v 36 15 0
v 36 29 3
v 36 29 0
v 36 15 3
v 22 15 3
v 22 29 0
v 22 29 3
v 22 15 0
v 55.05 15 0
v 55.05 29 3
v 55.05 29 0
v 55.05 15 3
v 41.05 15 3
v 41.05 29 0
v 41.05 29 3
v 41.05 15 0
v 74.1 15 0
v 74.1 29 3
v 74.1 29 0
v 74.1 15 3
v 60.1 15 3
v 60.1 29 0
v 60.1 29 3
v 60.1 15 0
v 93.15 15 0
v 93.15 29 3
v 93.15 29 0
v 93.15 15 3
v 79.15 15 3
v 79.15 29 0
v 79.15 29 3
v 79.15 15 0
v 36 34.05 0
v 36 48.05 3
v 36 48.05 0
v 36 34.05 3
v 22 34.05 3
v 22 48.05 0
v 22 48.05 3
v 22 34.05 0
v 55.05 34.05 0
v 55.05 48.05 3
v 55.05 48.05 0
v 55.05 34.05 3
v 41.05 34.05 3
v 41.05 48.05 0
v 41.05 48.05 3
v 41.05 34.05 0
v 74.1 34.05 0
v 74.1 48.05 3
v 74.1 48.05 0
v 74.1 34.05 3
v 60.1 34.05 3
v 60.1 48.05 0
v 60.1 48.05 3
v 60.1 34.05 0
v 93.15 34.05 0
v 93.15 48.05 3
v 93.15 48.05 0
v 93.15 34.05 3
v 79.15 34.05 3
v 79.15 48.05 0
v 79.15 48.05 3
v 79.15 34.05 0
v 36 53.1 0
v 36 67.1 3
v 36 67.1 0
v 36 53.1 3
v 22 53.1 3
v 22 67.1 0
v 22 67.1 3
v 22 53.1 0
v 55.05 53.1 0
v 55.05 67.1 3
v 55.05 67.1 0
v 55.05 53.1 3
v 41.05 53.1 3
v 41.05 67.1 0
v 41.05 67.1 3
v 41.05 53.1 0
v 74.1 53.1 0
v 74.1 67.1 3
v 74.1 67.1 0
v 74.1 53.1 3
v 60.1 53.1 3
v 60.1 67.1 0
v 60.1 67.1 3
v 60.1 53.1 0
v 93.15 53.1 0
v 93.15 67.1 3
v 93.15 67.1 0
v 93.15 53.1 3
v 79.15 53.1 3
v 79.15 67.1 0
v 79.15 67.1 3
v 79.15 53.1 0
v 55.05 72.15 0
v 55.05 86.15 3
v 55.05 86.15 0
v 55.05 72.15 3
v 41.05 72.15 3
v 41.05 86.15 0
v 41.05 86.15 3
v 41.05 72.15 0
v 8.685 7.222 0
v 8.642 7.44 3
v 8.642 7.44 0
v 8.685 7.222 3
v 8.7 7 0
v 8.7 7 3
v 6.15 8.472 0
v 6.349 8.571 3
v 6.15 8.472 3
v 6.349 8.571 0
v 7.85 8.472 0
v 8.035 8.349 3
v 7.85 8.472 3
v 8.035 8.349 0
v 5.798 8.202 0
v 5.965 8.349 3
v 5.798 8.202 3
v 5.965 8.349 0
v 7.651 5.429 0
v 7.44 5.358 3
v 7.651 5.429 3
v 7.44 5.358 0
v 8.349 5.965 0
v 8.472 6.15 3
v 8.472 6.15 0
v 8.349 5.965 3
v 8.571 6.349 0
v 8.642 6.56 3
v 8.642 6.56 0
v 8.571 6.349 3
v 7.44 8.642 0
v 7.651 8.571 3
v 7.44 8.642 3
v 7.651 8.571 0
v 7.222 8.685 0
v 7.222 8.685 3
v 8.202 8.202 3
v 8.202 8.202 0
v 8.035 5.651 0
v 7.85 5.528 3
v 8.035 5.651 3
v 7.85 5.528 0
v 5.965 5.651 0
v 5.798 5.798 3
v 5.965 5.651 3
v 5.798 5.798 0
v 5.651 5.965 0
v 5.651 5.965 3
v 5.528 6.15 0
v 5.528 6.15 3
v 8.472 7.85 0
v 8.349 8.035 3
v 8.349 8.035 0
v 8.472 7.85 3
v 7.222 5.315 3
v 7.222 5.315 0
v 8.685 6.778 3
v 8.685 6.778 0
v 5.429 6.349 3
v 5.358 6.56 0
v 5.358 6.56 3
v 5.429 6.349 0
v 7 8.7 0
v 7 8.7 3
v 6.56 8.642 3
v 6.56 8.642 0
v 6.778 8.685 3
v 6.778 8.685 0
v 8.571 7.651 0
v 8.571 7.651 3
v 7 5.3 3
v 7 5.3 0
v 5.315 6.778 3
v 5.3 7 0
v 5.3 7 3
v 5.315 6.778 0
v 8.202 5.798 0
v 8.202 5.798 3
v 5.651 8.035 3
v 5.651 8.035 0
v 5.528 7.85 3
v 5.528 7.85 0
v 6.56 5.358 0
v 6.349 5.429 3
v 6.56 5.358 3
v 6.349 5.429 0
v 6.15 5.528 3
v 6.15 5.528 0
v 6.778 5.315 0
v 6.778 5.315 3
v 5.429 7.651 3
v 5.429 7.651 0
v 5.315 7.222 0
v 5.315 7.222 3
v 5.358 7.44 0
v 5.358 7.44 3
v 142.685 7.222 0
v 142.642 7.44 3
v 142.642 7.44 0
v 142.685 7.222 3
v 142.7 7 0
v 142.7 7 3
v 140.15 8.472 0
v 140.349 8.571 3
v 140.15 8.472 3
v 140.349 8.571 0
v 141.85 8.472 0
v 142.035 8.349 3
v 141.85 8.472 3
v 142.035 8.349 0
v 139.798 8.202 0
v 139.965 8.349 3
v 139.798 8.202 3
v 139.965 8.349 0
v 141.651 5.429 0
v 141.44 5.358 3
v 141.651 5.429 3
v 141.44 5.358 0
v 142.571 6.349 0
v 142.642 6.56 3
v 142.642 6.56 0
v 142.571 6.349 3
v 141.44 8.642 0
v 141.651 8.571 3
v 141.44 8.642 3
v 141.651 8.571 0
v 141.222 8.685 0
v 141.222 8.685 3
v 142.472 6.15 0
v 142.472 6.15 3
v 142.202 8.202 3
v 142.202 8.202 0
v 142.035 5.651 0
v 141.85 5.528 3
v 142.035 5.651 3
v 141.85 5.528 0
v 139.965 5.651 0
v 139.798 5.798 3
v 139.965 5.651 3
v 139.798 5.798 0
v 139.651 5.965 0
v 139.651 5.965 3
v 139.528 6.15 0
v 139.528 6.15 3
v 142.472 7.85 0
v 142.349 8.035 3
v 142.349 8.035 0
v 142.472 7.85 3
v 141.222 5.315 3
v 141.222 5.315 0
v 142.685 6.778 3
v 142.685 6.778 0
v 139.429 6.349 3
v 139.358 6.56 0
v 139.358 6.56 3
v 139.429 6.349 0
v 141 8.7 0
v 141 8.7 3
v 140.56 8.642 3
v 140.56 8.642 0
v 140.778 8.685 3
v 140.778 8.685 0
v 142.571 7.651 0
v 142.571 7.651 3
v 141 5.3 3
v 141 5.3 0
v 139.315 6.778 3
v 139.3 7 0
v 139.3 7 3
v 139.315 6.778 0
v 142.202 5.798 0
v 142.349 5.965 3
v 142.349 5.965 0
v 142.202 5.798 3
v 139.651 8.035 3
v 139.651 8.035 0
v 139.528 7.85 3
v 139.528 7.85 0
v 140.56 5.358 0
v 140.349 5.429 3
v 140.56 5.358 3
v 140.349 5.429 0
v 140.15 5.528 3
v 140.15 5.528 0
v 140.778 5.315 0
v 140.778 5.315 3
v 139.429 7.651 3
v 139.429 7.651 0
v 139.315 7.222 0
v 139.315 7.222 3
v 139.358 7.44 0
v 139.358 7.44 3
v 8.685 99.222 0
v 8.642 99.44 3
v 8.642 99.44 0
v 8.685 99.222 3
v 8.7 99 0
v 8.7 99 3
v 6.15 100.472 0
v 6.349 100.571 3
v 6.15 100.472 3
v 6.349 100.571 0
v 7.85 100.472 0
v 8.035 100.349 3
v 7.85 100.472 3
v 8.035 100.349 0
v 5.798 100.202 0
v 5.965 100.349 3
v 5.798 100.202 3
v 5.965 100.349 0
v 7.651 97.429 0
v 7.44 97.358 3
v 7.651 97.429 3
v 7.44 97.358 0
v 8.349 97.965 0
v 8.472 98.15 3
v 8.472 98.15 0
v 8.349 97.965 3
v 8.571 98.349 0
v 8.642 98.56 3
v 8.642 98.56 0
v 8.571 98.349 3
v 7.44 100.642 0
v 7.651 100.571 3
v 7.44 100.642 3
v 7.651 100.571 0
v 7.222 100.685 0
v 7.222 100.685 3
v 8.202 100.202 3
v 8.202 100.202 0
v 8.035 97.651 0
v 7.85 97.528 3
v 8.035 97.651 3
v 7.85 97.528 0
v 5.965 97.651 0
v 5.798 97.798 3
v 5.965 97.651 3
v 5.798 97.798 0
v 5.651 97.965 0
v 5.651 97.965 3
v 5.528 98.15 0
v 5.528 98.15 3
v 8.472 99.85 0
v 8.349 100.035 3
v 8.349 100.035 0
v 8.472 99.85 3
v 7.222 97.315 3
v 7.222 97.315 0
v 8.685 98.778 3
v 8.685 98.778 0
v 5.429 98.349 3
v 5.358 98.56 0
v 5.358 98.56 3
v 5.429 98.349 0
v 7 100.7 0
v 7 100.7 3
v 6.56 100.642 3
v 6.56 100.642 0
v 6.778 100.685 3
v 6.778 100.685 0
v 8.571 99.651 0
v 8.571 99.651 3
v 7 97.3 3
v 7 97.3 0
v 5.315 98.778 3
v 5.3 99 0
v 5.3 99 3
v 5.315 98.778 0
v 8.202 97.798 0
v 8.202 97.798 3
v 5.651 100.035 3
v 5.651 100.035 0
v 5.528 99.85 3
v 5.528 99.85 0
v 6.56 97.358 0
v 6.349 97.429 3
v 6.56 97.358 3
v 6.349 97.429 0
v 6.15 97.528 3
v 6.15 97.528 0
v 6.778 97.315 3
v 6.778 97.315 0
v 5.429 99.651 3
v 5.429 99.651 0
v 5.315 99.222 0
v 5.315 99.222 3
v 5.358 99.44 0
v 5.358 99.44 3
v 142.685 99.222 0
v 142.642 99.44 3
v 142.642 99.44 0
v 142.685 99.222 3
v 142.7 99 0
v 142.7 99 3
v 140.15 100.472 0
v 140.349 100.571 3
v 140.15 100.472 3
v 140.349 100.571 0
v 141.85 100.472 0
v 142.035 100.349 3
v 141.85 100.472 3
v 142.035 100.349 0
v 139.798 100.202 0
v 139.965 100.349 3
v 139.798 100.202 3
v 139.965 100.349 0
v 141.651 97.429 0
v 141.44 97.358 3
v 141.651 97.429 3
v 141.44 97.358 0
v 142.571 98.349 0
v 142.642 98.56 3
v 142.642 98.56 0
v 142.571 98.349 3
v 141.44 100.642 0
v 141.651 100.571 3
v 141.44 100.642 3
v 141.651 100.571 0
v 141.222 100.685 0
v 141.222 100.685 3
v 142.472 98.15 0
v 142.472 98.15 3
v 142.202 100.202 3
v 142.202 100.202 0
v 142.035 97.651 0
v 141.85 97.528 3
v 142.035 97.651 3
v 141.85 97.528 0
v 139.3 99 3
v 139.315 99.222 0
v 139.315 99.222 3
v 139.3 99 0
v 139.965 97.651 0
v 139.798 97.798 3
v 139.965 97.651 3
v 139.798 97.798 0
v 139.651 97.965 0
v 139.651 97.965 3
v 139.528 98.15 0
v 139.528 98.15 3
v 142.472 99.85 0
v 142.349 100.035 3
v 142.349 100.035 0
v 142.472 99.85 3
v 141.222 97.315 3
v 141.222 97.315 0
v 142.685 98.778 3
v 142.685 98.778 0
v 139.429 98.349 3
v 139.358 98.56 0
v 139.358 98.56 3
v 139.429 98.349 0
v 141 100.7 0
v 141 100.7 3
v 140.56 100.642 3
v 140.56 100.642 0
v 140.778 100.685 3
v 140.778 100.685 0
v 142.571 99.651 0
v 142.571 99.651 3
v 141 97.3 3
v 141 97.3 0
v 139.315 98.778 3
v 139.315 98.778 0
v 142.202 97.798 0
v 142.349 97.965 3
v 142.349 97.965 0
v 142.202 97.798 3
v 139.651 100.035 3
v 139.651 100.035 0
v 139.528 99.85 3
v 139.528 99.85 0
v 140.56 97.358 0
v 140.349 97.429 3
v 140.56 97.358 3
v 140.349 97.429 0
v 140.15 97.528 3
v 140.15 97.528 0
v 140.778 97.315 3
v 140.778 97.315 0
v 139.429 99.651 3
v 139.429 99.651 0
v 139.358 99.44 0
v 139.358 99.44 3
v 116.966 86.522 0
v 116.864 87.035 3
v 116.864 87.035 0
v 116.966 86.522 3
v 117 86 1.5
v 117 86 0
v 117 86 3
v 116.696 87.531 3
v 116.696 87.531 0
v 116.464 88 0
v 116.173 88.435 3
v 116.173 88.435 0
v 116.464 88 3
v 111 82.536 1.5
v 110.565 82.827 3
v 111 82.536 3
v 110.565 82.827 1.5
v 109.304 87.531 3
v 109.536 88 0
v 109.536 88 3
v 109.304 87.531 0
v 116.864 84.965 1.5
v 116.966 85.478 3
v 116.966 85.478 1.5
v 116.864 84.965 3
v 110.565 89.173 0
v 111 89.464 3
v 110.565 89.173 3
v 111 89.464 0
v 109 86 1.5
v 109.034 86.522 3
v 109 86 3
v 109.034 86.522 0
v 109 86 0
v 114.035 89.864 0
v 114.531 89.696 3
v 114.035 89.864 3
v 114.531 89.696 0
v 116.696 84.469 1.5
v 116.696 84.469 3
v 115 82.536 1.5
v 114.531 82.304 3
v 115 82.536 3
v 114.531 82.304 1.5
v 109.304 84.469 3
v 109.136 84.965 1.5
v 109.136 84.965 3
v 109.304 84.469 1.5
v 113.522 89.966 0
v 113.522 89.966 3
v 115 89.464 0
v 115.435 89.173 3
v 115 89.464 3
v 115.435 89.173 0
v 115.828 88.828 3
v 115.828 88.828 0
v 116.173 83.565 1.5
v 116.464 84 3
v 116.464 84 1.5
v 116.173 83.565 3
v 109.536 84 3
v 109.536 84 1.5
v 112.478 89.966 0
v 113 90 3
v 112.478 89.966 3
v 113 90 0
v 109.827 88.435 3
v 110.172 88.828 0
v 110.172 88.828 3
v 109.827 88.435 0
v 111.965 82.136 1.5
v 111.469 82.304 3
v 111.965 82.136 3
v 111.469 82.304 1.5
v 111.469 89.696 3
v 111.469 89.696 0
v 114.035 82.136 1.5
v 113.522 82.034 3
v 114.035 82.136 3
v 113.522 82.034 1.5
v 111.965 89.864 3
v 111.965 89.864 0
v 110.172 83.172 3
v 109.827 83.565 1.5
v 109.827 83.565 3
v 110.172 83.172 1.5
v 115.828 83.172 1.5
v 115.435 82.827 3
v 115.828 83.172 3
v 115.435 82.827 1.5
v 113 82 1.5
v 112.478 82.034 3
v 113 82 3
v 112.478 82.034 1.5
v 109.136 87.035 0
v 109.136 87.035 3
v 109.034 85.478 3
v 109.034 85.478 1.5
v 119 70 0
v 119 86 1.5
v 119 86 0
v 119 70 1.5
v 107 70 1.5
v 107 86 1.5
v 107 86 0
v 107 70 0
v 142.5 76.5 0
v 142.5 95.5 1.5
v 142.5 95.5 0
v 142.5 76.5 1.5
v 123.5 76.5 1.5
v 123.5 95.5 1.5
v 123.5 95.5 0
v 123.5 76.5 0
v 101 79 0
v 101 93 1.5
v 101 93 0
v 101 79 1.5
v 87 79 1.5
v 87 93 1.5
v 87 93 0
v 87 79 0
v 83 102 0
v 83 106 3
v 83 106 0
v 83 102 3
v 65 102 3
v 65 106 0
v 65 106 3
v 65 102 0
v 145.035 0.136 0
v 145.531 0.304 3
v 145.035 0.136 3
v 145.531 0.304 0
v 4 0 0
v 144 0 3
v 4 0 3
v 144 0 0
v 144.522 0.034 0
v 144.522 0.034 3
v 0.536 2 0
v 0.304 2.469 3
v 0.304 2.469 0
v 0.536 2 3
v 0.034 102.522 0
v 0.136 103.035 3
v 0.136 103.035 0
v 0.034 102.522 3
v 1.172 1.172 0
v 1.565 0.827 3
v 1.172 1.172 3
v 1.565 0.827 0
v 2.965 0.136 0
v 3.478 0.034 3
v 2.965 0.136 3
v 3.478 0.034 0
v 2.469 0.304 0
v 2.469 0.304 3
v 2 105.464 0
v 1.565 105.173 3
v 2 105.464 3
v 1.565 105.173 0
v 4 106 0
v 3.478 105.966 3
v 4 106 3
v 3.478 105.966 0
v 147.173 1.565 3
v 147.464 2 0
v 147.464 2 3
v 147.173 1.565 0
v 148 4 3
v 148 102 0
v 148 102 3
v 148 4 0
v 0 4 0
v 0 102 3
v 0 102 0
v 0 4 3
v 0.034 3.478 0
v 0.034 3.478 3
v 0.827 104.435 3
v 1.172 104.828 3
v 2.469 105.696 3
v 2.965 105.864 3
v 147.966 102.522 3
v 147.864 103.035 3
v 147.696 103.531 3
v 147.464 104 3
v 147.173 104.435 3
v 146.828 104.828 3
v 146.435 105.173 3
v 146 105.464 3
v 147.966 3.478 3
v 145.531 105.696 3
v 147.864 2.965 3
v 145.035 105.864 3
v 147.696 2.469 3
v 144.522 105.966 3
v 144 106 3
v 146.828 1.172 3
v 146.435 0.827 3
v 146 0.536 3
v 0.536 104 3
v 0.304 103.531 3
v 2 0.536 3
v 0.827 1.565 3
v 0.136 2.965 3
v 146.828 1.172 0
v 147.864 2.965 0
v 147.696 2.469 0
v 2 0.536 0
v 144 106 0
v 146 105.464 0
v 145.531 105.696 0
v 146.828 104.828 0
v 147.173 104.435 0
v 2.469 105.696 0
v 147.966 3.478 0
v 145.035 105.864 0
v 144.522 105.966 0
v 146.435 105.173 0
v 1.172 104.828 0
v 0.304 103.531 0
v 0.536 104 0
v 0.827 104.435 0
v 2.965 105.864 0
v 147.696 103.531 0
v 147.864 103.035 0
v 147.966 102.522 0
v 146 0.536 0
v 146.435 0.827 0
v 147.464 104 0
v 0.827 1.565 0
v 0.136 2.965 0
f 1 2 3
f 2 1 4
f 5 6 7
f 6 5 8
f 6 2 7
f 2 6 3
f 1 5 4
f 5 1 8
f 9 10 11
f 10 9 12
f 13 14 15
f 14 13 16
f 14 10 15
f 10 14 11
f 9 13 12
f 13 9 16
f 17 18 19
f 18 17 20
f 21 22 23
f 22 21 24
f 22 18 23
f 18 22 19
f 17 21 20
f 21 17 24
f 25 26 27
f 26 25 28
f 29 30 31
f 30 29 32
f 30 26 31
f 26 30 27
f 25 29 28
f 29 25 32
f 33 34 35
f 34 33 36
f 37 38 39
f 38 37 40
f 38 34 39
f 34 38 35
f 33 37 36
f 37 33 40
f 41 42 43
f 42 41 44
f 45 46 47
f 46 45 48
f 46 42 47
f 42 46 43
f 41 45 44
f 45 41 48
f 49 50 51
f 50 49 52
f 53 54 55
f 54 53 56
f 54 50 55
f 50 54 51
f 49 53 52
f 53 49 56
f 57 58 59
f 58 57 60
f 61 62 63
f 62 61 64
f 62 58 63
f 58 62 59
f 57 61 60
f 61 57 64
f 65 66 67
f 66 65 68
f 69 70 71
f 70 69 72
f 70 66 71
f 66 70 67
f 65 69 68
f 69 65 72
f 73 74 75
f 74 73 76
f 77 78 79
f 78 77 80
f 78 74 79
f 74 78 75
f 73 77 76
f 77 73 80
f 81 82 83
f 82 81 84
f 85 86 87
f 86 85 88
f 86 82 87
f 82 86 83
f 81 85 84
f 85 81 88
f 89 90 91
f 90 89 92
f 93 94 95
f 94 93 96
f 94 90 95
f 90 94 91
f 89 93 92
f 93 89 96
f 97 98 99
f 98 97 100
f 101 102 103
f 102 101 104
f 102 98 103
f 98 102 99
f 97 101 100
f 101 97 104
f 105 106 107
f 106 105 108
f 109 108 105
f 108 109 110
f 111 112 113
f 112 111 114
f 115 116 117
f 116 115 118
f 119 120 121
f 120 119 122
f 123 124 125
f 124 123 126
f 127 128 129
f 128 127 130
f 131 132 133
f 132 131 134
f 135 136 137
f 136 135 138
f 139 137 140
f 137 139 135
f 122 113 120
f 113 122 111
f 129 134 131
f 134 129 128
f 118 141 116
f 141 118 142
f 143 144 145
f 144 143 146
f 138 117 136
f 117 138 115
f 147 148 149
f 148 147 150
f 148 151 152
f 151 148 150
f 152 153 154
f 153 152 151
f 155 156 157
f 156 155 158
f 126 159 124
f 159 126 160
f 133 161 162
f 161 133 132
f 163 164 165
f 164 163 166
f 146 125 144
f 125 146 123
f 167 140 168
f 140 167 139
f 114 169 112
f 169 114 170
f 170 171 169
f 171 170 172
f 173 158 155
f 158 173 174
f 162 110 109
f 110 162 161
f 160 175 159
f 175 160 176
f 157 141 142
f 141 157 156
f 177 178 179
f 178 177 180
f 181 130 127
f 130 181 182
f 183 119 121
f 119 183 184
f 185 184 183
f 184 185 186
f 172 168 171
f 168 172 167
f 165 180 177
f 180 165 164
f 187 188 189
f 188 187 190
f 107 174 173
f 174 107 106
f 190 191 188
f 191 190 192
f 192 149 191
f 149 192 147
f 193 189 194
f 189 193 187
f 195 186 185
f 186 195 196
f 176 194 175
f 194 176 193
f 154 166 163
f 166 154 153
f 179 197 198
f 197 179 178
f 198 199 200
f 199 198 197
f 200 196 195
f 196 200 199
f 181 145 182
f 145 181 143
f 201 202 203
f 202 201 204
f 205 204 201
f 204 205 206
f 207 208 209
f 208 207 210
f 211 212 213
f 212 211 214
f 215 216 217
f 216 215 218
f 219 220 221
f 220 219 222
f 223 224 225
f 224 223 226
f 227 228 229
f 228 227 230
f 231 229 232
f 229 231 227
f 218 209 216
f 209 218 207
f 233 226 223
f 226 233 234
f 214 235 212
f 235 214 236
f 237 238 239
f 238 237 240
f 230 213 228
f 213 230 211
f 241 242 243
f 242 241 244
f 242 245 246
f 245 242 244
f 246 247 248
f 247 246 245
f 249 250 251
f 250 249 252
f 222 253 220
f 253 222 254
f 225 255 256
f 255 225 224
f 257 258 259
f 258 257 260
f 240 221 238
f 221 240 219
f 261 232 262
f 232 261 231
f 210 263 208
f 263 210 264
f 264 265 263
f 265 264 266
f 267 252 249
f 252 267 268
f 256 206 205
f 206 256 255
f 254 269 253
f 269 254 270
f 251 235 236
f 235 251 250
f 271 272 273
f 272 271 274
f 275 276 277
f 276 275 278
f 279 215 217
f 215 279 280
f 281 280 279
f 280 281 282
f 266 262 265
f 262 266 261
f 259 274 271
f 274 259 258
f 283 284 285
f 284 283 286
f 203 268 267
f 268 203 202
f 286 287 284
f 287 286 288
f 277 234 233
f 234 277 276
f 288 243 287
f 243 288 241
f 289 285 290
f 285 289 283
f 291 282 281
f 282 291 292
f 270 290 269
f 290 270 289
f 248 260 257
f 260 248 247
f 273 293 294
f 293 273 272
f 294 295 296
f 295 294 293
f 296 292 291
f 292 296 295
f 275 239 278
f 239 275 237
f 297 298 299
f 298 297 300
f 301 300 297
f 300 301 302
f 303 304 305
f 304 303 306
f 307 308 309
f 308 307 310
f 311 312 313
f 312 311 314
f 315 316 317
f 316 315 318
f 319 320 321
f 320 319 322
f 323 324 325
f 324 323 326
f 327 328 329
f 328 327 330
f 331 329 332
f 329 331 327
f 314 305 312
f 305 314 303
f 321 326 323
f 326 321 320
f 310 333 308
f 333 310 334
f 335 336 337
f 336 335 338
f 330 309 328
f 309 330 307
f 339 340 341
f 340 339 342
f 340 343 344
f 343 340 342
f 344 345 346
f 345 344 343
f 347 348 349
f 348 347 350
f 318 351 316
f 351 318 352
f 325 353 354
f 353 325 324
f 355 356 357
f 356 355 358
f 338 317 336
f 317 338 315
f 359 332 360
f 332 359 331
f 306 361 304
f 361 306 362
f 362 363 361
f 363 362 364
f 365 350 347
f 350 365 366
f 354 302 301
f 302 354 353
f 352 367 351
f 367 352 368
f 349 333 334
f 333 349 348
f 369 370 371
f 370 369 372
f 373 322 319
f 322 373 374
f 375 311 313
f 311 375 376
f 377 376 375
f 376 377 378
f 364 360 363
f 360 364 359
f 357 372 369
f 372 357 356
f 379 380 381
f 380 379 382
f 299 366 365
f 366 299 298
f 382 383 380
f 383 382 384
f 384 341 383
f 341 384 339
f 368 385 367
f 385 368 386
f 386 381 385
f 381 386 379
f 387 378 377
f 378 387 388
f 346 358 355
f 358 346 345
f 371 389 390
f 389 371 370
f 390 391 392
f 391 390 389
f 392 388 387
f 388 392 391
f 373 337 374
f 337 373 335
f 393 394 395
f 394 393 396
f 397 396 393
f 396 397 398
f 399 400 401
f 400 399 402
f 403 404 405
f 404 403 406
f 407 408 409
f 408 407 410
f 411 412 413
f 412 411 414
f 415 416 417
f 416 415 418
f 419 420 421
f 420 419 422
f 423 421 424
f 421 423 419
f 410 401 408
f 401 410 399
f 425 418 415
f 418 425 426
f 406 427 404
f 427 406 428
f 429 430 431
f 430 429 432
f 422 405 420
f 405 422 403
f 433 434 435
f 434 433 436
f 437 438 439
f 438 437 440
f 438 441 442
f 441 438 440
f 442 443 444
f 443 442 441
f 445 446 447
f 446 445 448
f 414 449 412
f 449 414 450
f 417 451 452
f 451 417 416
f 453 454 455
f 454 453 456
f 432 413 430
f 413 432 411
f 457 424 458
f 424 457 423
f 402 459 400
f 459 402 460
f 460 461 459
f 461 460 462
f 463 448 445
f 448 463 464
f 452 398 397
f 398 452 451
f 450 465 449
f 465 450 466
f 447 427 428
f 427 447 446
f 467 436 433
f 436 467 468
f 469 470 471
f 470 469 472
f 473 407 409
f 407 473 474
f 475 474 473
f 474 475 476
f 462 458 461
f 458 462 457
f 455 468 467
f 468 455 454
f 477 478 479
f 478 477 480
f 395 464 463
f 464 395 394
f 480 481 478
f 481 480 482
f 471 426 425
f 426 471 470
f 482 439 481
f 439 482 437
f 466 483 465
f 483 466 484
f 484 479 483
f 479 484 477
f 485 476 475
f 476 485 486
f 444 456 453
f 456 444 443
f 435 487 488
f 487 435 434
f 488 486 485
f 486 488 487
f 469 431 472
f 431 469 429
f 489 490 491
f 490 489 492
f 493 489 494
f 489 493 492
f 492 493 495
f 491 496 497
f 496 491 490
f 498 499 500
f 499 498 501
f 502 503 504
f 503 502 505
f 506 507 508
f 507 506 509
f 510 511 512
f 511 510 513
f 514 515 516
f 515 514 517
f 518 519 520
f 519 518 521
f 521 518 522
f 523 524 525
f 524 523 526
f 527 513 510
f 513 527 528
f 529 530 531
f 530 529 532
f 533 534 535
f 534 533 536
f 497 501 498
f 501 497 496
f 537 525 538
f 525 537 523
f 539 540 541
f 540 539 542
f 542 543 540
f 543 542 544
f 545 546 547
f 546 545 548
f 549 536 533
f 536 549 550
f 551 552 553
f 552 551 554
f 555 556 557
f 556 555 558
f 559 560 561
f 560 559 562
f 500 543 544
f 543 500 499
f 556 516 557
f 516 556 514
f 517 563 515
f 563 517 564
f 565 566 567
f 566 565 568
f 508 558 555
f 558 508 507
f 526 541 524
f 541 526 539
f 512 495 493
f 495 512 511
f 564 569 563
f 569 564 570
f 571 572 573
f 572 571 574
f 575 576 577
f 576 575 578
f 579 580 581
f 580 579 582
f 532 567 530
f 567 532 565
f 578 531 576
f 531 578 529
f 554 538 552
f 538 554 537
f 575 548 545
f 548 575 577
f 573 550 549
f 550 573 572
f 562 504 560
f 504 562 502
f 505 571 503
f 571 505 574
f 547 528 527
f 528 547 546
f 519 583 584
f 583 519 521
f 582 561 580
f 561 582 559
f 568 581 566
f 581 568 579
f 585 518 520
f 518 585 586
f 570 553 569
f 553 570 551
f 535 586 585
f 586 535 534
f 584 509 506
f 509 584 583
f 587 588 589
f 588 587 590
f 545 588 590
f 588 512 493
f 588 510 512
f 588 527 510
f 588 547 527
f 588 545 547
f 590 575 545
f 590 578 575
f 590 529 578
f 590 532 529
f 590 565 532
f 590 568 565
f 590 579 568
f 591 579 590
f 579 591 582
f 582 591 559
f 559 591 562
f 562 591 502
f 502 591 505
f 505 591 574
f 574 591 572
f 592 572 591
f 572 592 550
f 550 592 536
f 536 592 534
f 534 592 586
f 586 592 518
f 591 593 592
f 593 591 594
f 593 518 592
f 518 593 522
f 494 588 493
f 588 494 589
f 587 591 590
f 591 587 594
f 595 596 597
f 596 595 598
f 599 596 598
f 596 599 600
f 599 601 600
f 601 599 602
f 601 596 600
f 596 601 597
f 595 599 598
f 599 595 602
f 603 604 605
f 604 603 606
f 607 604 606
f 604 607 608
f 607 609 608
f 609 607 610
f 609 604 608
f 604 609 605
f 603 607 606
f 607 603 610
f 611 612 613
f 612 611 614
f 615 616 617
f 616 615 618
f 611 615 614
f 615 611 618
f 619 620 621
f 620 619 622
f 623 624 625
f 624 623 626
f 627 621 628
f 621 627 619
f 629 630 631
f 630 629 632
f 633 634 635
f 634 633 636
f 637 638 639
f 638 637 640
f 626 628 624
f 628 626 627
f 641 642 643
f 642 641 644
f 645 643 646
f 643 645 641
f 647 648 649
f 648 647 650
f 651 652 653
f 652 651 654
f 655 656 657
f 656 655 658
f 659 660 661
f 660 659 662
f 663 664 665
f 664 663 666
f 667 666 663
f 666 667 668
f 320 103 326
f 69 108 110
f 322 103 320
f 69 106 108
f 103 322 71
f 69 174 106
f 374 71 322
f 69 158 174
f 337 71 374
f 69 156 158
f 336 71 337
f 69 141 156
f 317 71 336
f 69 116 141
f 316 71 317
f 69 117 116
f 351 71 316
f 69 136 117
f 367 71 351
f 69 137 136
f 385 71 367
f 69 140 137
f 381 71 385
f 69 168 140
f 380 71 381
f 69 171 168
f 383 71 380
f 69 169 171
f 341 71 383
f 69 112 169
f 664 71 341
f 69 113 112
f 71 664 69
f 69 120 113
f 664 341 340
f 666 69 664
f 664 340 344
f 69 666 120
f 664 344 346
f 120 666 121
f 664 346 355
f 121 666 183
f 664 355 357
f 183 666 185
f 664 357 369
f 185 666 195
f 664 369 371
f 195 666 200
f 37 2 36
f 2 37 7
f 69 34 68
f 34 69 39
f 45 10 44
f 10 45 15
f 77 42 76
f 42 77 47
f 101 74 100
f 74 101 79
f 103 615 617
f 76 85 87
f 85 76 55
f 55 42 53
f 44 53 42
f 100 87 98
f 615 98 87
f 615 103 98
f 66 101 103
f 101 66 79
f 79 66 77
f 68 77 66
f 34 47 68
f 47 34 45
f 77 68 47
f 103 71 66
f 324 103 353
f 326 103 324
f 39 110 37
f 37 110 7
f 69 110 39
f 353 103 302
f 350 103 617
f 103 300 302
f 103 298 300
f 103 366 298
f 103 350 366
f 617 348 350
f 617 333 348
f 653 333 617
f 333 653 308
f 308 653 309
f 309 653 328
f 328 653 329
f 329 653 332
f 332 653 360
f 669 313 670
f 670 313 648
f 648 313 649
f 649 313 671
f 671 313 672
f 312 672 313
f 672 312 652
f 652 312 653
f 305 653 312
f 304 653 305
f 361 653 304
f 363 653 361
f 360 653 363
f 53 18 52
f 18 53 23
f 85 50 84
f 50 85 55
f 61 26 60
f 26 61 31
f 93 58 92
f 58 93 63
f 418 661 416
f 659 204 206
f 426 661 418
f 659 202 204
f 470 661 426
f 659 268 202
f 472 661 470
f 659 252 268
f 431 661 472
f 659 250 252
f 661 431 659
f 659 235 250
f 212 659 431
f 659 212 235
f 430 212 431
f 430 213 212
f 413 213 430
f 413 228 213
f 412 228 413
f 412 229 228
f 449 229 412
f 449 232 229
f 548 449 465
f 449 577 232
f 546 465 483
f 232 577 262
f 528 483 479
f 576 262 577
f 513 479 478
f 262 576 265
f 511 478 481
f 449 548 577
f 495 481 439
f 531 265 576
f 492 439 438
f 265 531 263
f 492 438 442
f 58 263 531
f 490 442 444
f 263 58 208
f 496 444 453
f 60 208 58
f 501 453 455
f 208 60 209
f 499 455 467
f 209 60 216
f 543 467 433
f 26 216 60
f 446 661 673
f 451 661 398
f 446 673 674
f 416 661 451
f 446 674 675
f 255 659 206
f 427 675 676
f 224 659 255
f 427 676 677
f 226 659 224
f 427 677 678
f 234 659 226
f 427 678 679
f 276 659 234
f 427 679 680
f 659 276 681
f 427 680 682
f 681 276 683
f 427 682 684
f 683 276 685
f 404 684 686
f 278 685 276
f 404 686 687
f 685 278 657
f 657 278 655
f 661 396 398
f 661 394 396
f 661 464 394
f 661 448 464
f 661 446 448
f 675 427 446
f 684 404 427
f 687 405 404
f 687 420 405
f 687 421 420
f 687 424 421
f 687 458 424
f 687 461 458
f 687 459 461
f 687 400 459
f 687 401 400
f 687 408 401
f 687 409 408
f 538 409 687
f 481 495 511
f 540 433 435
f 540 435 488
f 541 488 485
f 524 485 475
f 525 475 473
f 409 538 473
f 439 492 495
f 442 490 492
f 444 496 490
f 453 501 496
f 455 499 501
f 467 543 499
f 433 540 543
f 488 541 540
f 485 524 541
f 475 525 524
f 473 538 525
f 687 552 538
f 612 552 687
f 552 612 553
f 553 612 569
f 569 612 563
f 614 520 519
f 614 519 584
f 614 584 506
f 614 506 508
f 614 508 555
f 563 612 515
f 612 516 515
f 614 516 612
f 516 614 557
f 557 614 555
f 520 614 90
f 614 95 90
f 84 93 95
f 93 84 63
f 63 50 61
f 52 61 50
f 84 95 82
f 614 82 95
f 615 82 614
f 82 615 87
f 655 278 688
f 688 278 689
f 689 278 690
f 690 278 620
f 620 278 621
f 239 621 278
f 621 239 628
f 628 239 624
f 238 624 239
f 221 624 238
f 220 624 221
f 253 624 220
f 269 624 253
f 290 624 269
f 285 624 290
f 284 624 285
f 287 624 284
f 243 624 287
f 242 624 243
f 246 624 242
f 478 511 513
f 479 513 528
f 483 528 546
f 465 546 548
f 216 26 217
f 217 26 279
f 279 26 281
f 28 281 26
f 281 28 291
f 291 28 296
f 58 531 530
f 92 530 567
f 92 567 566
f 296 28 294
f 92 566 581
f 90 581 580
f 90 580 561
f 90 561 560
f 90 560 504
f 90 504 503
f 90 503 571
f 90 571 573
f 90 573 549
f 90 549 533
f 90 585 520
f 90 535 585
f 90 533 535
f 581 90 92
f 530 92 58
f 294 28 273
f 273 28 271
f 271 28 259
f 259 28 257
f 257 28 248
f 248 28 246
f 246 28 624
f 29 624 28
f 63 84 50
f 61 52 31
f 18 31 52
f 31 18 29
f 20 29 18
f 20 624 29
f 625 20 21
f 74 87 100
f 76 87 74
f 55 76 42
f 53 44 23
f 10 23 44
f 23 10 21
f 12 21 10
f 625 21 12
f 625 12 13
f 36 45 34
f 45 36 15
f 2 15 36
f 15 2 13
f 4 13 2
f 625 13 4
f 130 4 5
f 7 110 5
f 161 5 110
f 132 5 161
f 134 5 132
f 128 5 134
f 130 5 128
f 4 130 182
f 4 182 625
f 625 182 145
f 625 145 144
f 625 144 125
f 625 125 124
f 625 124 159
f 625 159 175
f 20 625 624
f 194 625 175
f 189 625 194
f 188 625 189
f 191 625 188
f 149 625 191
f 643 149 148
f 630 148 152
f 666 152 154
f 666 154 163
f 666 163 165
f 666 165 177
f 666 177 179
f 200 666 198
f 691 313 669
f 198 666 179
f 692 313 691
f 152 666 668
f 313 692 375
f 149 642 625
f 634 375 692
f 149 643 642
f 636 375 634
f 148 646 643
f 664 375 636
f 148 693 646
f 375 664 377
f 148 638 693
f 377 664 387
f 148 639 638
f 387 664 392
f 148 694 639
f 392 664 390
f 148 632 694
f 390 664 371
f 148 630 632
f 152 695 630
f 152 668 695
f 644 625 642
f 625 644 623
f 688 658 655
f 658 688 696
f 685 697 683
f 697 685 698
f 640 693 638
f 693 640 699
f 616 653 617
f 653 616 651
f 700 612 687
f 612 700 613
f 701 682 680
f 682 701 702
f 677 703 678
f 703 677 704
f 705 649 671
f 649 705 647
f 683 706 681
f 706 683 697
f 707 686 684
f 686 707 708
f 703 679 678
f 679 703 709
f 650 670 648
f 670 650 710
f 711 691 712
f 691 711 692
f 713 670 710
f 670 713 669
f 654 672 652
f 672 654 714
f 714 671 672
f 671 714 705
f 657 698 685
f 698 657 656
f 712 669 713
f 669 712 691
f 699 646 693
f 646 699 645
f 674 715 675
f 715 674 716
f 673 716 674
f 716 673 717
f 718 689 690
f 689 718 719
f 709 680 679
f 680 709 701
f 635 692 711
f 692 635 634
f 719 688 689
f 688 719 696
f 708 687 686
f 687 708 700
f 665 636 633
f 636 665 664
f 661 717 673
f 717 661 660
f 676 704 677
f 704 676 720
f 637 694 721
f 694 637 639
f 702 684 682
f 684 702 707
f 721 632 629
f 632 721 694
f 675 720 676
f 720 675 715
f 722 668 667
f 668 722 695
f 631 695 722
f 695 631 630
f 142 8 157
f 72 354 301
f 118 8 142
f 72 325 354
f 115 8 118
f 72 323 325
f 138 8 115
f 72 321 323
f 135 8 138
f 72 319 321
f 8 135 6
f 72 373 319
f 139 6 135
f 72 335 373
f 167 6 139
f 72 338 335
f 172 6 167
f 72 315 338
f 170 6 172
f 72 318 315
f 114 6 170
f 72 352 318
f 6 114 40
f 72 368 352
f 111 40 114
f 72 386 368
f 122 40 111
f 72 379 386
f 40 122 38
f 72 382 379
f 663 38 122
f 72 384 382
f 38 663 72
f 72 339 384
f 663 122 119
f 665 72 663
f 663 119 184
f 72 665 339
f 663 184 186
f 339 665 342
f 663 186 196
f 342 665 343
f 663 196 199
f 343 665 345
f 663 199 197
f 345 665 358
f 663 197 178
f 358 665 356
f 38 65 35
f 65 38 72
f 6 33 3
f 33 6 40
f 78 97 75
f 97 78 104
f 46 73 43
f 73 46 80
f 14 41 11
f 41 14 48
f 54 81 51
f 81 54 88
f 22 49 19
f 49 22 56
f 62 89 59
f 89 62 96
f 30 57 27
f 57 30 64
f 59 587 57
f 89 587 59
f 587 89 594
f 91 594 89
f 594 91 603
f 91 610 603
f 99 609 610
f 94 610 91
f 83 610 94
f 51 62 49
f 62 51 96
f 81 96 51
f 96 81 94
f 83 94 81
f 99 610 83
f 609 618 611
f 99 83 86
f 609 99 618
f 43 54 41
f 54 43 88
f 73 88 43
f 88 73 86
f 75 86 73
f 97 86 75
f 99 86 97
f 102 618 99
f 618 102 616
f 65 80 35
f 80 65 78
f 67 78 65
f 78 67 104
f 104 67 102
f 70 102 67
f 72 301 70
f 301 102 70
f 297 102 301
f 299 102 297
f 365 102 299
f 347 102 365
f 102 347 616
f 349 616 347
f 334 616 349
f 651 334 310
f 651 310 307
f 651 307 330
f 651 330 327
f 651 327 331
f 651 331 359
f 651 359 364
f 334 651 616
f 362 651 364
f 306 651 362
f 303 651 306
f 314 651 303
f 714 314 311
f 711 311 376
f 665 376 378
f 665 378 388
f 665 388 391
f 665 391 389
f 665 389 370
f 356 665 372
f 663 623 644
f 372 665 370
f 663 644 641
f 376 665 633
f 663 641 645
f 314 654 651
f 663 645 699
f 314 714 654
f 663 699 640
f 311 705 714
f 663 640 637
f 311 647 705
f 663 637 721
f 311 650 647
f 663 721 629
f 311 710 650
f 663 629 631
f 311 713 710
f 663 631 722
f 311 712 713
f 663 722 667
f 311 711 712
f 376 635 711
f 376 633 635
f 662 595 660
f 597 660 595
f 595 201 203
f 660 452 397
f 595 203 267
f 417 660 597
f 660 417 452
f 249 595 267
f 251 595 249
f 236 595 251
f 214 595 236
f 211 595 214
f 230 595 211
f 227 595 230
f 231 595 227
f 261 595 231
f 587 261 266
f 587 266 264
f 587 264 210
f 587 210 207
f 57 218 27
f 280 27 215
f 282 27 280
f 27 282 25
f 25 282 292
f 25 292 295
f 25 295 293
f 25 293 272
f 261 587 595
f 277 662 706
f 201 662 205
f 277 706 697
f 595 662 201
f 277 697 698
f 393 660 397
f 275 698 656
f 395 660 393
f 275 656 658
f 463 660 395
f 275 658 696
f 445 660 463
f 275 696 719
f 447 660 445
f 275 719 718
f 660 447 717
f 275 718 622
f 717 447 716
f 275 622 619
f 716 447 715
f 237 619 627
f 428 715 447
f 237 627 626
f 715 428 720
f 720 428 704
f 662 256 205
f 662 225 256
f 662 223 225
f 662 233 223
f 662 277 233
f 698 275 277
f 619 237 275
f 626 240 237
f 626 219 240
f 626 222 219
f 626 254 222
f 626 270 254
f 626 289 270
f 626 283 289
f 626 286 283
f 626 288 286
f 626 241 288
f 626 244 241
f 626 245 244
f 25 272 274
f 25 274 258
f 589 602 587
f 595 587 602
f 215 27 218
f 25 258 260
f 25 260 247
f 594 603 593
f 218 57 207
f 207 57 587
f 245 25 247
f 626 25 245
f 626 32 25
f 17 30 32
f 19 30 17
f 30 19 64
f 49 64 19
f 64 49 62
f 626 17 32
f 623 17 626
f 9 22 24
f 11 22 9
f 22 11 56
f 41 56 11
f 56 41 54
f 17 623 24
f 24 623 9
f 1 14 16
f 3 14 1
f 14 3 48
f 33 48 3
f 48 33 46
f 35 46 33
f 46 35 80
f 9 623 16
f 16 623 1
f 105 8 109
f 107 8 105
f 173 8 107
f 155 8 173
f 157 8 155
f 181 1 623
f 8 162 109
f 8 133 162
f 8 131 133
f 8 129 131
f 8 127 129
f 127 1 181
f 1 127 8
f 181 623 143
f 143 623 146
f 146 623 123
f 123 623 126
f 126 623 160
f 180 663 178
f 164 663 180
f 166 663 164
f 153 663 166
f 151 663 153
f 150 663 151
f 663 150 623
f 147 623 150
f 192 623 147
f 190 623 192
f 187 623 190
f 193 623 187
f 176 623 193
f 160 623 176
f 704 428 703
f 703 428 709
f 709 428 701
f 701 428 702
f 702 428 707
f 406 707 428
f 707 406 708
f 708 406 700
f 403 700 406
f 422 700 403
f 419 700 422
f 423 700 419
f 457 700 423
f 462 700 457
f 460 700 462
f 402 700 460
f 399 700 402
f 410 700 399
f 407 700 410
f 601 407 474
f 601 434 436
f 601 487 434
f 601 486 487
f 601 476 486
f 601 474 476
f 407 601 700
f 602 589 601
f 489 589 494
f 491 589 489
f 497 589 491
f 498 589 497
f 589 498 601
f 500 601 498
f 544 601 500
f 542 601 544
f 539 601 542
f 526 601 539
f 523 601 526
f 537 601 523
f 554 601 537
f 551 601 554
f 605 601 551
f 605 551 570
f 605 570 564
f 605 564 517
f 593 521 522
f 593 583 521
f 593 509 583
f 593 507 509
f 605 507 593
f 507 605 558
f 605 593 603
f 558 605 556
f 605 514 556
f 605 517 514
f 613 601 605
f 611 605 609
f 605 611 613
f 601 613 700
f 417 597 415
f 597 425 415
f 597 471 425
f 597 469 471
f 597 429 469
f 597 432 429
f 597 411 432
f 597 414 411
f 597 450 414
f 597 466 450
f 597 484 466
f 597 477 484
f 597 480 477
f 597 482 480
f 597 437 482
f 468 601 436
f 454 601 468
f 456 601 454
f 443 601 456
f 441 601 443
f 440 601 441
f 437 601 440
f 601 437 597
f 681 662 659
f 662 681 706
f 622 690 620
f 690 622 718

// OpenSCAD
// CodexPad / 13keyAgentTools Rev 0.1
// Parametric first-pass enclosure for a hand-wired Arduino Micro macro pad.
// Export one part at a time by changing `part`.

part = "plate"; // plate / bottom / assembly / tolerance

$fn = 48;

case_w = 148;
case_d = 106;
plate_t = 3.0;
bottom_h = 18.0;
bottom_t = 3.0;
wall = 3.0;
corner_r = 4.0;

key_pitch = 19.05;
key_hole = 14.0;
key_origin = [22, 15];

// 4 x 4 electrical matrix with three unused positions.
// Rev 0.1 uses 13 individual 1U keys. A 2U visual key can be added later.
key_positions = [
    [0, 0], [1, 0], [2, 0], [3, 0],
    [0, 1], [1, 1], [2, 1], [3, 1],
    [0, 2], [1, 2], [2, 2], [3, 2],
    [1, 3]
];

screw_positions = [
    [7, 7],
    [case_w - 7, 7],
    [7, case_d - 7],
    [case_w - 7, case_d - 7]
];

module rounded_prism(w, d, h, r) {
    linear_extrude(height = h)
        offset(r = r)
            offset(delta = -r)
                square([w, d], center = false);
}

module key_holes(extra = 1) {
    for (p = key_positions) {
        translate([
            key_origin[0] + p[0] * key_pitch,
            key_origin[1] + p[1] * key_pitch,
            -extra
        ])
            cube([key_hole, key_hole, plate_t + 2 * extra], center = false);
    }
}

module screw_holes(extra = 1) {
    for (p = screw_positions) {
        translate([p[0], p[1], -extra])
            cylinder(d = 3.4, h = plate_t + bottom_h + 2 * extra);
    }
}

module control_holes(extra = 1) {
    // EC11 shaft and anti-rotation clearance.
    translate([113, 86, -extra])
        cylinder(d = 8.0, h = plate_t + 2 * extra);
    translate([113, 78, -extra])
        cube([12, 16, plate_t + 2 * extra], center = true);

    // Generic 2-axis joystick keep-out. Tune after buying the actual module.
    translate([133, 86, -extra])
        cube([19, 19, plate_t + 2 * extra], center = true);

    // TTP223 copper touch window.
    translate([94, 86, -extra])
        cube([14, 14, plate_t + 2 * extra], center = true);

    // Rear USB opening. This is intentionally oversized for cable tolerance.
    translate([case_w / 2 - 9, case_d - 4, -extra])
        cube([18, 8, 9], center = false);
}

module plate() {
    difference() {
        rounded_prism(case_w, case_d, plate_t, corner_r);
        key_holes();
        screw_holes();
        control_holes();
    }
}

module bottom() {
    difference() {
        rounded_prism(case_w, case_d, bottom_h, corner_r);

        // Main cavity. Keep a solid bottom and a perimeter wall.
        translate([wall, wall, bottom_t])
            cube([
                case_w - 2 * wall,
                case_d - 2 * wall,
                bottom_h
            ], center = false);

        // Through holes for M3 hardware.
        for (p = screw_positions) {
            translate([p[0], p[1], -1])
                cylinder(d = 3.4, h = bottom_h + 2);
        }

        // Rear cable relief.
        translate([case_w / 2 - 10, case_d - 5, 4])
            cube([20, 8, 10], center = false);
    }
}

module tolerance_coupon() {
    coupon_w = 70;
    coupon_d = 42;
    difference() {
        rounded_prism(coupon_w, coupon_d, 4, 2);

        // Four switch-hole variants: 13.8, 14.0, 14.2, 14.4 mm.
        for (i = [0 : 3]) {
            translate([9 + i * 17, 21, -1])
                cube([13.8 + i * 0.2, 13.8 + i * 0.2, 6], center = true);
        }

        // M3 insert-hole variants.
        for (i = [0 : 2]) {
            translate([12 + i * 18, 8, -1])
                cylinder(d = 4.0 + i * 0.2, h = 6);
        }
    }
}

module assembly() {
    color("#d8d8d8")
        translate([0, 0, bottom_h])
            plate();
    color("#666666")
        bottom();
}

if (part == "plate") {
    plate();
} else if (part == "bottom") {
    bottom();
} else if (part == "assembly") {
    assembly();
} else if (part == "tolerance") {
    tolerance_coupon();
}
